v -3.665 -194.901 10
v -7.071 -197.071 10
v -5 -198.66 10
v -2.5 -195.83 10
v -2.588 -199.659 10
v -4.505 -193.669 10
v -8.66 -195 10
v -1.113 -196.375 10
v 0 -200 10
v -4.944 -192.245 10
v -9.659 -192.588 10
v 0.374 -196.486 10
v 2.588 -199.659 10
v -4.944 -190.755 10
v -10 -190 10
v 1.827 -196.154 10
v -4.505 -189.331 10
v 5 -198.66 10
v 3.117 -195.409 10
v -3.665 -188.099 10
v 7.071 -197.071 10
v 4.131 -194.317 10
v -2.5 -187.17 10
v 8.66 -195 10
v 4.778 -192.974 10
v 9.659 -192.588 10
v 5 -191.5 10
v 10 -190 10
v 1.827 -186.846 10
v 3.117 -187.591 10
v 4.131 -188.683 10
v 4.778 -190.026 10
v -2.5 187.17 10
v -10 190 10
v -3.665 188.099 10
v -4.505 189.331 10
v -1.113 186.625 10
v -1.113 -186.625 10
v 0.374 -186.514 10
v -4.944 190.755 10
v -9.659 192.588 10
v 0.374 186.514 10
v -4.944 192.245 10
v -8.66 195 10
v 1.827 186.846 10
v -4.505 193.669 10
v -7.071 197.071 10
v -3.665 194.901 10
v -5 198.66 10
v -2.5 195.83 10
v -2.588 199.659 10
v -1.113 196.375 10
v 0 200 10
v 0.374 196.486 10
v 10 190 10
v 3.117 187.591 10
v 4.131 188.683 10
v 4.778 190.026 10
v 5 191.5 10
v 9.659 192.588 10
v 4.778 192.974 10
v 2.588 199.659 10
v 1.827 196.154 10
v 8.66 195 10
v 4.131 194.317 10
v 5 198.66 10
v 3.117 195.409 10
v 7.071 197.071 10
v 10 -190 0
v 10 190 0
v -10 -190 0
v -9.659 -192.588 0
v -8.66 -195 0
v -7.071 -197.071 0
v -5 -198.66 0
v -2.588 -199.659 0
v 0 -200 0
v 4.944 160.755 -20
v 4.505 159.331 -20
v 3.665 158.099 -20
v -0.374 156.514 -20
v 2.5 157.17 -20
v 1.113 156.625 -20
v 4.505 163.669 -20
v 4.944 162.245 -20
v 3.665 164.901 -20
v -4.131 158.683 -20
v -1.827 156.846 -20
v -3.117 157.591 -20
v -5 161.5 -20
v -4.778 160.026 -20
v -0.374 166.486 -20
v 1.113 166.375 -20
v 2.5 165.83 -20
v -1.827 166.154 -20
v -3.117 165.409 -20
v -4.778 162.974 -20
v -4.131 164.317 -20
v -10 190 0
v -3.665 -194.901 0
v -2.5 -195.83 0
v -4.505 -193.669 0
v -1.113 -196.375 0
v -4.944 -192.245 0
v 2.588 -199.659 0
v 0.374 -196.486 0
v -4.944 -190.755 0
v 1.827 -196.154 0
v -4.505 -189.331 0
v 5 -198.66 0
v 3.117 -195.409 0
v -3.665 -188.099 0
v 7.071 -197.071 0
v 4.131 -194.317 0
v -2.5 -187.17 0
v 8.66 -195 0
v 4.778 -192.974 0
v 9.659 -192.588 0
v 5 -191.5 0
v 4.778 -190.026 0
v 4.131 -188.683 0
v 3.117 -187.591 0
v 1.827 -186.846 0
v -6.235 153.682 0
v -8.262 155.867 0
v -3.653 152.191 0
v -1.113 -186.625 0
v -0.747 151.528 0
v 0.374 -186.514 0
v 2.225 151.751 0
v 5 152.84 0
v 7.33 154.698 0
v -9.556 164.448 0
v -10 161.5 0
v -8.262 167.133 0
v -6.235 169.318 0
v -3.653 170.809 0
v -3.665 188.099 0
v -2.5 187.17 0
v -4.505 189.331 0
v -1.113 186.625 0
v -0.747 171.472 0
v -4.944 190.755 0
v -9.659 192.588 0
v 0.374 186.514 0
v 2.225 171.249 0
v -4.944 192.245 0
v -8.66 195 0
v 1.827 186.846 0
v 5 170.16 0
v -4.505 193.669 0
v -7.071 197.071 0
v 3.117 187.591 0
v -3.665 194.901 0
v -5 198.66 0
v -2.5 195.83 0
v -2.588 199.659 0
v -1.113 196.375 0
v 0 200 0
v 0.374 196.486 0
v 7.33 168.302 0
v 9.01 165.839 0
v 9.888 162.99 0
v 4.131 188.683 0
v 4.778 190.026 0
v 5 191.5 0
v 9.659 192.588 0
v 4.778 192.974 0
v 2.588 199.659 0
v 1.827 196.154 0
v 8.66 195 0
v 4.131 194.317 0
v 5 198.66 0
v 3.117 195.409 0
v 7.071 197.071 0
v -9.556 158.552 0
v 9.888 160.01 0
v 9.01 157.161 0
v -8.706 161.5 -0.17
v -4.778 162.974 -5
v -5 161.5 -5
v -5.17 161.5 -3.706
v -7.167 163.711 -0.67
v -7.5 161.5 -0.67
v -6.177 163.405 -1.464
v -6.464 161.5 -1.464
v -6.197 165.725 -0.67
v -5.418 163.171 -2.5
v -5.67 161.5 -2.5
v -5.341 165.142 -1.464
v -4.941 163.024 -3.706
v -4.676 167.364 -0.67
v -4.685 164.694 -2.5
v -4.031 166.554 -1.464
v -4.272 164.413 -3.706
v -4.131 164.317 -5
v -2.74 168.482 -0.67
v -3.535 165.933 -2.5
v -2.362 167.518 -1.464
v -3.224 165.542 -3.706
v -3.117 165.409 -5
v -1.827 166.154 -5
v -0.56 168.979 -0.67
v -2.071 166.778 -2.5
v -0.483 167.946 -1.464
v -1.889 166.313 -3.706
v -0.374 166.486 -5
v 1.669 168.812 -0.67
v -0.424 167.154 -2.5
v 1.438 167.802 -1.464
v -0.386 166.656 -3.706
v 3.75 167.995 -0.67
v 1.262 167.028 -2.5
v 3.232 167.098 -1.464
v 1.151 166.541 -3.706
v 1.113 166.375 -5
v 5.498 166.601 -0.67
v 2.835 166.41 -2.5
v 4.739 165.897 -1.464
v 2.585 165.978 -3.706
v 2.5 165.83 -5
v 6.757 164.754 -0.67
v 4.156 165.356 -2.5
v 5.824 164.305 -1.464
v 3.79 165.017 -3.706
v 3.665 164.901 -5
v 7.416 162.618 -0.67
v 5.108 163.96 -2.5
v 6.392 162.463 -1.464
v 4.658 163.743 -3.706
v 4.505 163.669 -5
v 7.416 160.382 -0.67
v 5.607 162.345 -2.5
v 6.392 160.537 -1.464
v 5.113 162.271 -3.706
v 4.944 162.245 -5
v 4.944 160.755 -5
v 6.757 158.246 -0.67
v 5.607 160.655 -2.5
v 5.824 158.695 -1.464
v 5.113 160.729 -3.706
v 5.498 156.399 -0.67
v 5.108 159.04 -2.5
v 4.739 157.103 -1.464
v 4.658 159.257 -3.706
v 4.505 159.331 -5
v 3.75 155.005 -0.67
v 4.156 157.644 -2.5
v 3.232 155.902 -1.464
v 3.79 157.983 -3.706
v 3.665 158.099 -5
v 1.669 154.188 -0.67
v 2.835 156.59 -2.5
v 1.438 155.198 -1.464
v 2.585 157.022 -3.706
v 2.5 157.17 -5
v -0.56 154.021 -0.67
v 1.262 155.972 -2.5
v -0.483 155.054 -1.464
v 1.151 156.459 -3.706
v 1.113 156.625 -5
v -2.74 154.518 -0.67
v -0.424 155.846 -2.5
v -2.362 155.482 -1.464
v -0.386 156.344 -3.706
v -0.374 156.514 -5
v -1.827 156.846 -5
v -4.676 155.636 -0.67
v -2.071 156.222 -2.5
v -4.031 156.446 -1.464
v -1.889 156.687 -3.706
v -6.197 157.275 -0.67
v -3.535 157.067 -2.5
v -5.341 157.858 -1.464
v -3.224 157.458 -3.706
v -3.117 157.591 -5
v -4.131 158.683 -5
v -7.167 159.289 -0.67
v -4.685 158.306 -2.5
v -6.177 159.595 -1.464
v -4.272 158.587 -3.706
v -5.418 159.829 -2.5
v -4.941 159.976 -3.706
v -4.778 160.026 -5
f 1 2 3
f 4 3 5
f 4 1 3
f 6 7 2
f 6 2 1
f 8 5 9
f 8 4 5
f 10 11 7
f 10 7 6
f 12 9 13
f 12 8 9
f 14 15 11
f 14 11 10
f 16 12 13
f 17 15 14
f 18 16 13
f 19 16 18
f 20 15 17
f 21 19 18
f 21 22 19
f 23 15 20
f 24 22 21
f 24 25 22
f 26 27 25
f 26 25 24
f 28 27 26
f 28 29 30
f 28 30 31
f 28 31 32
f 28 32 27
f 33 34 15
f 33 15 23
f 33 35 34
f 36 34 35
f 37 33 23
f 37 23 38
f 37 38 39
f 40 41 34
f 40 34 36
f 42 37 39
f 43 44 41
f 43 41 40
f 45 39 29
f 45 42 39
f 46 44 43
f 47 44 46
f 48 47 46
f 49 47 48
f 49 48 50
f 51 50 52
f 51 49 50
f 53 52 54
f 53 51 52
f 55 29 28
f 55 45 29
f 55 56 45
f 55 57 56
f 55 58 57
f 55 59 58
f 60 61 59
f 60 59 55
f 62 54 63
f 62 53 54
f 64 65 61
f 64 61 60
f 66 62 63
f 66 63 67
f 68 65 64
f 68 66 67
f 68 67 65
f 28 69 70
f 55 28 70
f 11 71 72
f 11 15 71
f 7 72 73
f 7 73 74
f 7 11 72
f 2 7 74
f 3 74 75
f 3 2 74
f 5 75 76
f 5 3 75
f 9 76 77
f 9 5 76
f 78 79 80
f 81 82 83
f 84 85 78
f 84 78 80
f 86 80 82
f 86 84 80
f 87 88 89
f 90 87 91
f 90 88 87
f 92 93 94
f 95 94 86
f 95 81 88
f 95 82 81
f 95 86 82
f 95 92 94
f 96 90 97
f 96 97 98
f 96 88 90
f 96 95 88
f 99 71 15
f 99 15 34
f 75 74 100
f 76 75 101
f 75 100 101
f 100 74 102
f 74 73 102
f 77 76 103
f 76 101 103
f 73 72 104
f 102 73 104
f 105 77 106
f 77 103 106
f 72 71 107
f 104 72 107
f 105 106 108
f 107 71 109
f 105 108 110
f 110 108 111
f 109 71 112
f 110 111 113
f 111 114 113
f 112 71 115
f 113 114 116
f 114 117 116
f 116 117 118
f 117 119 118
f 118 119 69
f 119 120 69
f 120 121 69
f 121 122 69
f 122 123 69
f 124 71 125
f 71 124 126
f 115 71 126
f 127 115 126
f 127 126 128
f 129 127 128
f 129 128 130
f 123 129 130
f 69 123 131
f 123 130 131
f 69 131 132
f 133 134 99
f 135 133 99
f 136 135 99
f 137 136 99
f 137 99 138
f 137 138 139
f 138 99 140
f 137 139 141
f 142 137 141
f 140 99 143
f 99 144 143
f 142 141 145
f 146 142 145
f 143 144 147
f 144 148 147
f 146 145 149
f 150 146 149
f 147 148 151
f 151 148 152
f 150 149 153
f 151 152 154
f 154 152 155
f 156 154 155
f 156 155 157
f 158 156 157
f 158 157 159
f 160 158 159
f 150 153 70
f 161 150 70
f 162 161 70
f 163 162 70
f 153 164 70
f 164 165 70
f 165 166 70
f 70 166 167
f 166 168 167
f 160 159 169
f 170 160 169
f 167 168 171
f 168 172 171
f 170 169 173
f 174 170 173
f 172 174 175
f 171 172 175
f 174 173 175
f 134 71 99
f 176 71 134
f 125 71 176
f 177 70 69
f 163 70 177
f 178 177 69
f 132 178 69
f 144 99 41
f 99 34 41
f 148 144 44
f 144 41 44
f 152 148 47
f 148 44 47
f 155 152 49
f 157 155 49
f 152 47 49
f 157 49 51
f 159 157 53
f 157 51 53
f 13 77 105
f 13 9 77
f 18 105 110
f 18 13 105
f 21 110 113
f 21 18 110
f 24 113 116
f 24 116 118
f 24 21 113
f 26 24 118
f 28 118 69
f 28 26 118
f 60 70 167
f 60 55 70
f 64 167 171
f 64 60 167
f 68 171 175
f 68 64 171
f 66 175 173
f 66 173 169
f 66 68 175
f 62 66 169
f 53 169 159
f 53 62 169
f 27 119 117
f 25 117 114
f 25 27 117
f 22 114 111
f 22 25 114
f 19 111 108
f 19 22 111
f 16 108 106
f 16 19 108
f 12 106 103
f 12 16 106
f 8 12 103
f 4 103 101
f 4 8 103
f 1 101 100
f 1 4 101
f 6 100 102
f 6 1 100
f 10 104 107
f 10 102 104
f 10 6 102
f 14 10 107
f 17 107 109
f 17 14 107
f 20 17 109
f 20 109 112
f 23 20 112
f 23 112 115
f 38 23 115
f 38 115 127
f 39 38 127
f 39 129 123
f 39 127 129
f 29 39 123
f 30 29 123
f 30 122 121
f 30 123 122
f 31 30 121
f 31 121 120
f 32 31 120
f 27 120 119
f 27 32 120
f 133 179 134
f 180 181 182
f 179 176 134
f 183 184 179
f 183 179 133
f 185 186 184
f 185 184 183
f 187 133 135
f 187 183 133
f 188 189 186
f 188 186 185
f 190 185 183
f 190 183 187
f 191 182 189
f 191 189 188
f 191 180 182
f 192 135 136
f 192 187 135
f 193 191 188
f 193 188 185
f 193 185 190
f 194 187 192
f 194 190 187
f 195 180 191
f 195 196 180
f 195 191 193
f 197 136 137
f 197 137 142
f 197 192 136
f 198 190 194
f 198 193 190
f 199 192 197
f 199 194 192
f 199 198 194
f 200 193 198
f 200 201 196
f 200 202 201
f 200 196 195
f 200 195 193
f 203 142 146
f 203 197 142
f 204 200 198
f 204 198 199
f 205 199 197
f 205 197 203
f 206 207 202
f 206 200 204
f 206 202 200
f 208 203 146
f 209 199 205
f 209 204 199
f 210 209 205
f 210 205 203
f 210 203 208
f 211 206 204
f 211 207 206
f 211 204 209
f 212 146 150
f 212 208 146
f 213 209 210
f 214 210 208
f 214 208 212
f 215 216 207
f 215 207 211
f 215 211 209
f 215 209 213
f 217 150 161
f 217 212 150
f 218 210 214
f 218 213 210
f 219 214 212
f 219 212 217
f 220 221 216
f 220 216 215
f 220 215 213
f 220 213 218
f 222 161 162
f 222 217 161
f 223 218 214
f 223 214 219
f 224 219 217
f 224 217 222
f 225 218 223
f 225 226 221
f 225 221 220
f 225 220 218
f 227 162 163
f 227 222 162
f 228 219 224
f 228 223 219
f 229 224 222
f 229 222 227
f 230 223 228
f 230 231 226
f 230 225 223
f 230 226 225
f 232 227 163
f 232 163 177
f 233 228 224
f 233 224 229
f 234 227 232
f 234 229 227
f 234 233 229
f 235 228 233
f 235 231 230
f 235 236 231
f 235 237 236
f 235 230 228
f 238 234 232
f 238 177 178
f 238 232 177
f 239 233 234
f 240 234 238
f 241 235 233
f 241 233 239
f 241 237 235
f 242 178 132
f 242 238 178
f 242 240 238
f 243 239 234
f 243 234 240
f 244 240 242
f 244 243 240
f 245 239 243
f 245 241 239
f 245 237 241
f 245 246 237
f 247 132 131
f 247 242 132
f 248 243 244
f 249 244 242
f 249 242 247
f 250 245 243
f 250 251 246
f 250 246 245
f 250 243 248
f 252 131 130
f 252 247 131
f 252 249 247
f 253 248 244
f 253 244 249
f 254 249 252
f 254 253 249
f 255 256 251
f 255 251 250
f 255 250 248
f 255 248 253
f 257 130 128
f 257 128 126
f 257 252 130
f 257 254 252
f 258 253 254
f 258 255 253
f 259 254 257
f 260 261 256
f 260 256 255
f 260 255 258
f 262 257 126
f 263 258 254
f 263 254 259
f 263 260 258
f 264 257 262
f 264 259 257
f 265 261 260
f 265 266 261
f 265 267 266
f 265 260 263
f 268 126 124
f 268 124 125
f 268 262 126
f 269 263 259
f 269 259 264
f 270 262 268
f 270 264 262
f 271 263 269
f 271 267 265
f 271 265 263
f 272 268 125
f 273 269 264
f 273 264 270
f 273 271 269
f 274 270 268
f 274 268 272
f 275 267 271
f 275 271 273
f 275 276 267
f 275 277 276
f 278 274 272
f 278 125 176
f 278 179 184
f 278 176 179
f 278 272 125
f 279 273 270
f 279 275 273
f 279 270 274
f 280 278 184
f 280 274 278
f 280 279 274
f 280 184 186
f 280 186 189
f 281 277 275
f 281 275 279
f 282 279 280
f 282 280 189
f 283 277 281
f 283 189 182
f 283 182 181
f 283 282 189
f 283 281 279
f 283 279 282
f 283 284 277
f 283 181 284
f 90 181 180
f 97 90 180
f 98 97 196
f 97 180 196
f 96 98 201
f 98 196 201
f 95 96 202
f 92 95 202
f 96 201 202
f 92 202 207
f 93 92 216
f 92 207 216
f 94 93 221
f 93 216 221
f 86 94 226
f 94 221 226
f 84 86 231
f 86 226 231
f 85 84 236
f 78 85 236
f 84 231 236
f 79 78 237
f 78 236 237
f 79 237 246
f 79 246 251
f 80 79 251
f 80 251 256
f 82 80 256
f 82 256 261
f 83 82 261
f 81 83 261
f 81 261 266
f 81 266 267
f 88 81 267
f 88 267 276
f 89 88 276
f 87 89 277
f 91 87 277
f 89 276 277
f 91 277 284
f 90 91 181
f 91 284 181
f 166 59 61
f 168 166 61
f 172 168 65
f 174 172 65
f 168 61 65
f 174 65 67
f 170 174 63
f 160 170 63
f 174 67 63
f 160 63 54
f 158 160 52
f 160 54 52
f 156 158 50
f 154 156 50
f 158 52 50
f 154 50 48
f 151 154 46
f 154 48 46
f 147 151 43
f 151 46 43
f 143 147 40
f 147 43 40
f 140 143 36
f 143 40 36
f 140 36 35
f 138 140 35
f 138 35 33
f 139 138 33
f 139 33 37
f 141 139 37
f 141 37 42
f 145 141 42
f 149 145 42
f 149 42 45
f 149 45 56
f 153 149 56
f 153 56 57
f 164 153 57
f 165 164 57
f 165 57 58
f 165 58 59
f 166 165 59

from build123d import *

# Parameters (mm, degrees)
SKETCH1_W           = 20
SKETCH1_H           = 400
BOSS_EXTRUDE1_DEPTH = 10
FILLET1_R           = 10
SKETCH2_R           = 5
CUT_EXTRUDE1_DEPTH  = 201.499376558
SKETCH3_R           = 5
BOSS_EXTRUDE2_DEPTH = 20
FILLET2_R           = 5


with BuildPart() as part:
    # Sketch1 → Boss-Extrude1 (new body)
    with BuildSketch(Plane.XY):
        Rectangle(SKETCH1_W, SKETCH1_H)
    extrude(amount=BOSS_EXTRUDE1_DEPTH)

    # Fillet1
    fillet1_edges = [part.edges().sort_by_distance(p)[0] for p in [
        (-10, -200, 5),
        (10, -200, 5),
        (-10, 200, 5),
        (10, 200, 5),
    ]]
    fillet(fillet1_edges, radius=FILLET1_R - 0.0001)  # a hair under: the kernel refuses the full size

    # Sketch2 → Cut-Extrude1 (cut, through all)
    with BuildSketch(Plane.XY.offset(10)):
        with Locations((0, 191.5)):
            Circle(SKETCH2_R)
    cut_extrude1 = extrude(amount=-CUT_EXTRUDE1_DEPTH, mode=Mode.SUBTRACT)

    # Mirror1: Cut-Extrude1 across plane
    add(cut_extrude1.mirror(Plane.ZX), mode=Mode.SUBTRACT)

    # Sketch3 → Boss-Extrude2 (add)
    with BuildSketch(Plane(origin=(0, 0, 0), x_dir=(-1, 0, 0), z_dir=(0, 0, -1))):
        with Locations((0, 161.5)):
            Circle(SKETCH3_R)
    extrude(amount=BOSS_EXTRUDE2_DEPTH)

    # Fillet2
    fillet2_edges = [part.edges().sort_by_distance(p)[0] for p in [
        (5, 161.5, 0),
    ]]
    fillet(fillet2_edges, radius=FILLET2_R - 0.0001)  # a hair under: the kernel refuses the full size


solid = part.part
